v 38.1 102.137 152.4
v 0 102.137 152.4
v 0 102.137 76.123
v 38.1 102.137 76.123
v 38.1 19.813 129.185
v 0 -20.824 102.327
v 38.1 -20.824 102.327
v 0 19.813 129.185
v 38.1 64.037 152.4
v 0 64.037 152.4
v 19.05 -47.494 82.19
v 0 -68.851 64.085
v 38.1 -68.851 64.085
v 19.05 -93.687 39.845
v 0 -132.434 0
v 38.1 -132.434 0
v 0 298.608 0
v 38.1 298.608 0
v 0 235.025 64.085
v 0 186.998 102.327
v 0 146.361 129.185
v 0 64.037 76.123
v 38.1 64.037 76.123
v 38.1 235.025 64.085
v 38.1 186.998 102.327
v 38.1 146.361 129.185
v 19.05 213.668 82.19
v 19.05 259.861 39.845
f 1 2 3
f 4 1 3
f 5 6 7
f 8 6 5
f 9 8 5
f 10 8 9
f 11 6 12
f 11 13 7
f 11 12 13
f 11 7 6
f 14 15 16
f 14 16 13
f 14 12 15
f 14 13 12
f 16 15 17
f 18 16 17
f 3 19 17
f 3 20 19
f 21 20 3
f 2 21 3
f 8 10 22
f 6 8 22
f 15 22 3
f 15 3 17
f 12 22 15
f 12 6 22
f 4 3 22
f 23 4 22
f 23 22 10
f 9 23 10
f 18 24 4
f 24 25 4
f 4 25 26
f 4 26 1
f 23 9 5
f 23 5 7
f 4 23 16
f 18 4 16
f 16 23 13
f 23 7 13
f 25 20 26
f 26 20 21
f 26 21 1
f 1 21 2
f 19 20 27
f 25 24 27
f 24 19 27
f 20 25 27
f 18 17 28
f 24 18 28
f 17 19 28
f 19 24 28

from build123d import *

# Parameters (mm, degrees)
F1_DEPTH = 38.1


with BuildPart() as f1:
    # F0 (on Right) → F1 (new body)
    with BuildSketch(Plane.YZ):
        with BuildLine():
            add(Edge.make_bspline(
                [(-132.4336230755, 0), (-83.8873000655, 49.9797638867), (-61.4657106946, 74.5330828615), (22.5918702379, 134.2773763467), (64.0371870756, 152.4)],
                knots=[0, 0, 0, 0, 0.4863937211, 1, 1, 1, 1], degree=3))
            Line((-132.4336230755, 0), (83.0871870756, 0))
            Line((83.0871870756, 0), (298.6079972267, 0))
            add(Edge.make_bspline(
                [(298.6079972267, 0), (250.0616742167, 49.9797638867), (227.6400848458, 74.5330828615), (143.5825039133, 134.2773763467), (102.1371870756, 152.4)],
                knots=[0, 0, 0, 0, 0.4863937211, 1, 1, 1, 1], degree=3))
            Line((102.1371870756, 152.4), (102.1371870756, 76.1232599616))
            Line((102.1371870756, 76.1232599616), (83.0871870756, 76.1232599616))
            Line((83.0871870756, 76.1232599616), (64.0371870756, 76.1232599616))
            Line((64.0371870756, 76.1232599616), (64.0371870756, 152.4))
        make_face()
    extrude(amount=F1_DEPTH)


solid = f1.part
